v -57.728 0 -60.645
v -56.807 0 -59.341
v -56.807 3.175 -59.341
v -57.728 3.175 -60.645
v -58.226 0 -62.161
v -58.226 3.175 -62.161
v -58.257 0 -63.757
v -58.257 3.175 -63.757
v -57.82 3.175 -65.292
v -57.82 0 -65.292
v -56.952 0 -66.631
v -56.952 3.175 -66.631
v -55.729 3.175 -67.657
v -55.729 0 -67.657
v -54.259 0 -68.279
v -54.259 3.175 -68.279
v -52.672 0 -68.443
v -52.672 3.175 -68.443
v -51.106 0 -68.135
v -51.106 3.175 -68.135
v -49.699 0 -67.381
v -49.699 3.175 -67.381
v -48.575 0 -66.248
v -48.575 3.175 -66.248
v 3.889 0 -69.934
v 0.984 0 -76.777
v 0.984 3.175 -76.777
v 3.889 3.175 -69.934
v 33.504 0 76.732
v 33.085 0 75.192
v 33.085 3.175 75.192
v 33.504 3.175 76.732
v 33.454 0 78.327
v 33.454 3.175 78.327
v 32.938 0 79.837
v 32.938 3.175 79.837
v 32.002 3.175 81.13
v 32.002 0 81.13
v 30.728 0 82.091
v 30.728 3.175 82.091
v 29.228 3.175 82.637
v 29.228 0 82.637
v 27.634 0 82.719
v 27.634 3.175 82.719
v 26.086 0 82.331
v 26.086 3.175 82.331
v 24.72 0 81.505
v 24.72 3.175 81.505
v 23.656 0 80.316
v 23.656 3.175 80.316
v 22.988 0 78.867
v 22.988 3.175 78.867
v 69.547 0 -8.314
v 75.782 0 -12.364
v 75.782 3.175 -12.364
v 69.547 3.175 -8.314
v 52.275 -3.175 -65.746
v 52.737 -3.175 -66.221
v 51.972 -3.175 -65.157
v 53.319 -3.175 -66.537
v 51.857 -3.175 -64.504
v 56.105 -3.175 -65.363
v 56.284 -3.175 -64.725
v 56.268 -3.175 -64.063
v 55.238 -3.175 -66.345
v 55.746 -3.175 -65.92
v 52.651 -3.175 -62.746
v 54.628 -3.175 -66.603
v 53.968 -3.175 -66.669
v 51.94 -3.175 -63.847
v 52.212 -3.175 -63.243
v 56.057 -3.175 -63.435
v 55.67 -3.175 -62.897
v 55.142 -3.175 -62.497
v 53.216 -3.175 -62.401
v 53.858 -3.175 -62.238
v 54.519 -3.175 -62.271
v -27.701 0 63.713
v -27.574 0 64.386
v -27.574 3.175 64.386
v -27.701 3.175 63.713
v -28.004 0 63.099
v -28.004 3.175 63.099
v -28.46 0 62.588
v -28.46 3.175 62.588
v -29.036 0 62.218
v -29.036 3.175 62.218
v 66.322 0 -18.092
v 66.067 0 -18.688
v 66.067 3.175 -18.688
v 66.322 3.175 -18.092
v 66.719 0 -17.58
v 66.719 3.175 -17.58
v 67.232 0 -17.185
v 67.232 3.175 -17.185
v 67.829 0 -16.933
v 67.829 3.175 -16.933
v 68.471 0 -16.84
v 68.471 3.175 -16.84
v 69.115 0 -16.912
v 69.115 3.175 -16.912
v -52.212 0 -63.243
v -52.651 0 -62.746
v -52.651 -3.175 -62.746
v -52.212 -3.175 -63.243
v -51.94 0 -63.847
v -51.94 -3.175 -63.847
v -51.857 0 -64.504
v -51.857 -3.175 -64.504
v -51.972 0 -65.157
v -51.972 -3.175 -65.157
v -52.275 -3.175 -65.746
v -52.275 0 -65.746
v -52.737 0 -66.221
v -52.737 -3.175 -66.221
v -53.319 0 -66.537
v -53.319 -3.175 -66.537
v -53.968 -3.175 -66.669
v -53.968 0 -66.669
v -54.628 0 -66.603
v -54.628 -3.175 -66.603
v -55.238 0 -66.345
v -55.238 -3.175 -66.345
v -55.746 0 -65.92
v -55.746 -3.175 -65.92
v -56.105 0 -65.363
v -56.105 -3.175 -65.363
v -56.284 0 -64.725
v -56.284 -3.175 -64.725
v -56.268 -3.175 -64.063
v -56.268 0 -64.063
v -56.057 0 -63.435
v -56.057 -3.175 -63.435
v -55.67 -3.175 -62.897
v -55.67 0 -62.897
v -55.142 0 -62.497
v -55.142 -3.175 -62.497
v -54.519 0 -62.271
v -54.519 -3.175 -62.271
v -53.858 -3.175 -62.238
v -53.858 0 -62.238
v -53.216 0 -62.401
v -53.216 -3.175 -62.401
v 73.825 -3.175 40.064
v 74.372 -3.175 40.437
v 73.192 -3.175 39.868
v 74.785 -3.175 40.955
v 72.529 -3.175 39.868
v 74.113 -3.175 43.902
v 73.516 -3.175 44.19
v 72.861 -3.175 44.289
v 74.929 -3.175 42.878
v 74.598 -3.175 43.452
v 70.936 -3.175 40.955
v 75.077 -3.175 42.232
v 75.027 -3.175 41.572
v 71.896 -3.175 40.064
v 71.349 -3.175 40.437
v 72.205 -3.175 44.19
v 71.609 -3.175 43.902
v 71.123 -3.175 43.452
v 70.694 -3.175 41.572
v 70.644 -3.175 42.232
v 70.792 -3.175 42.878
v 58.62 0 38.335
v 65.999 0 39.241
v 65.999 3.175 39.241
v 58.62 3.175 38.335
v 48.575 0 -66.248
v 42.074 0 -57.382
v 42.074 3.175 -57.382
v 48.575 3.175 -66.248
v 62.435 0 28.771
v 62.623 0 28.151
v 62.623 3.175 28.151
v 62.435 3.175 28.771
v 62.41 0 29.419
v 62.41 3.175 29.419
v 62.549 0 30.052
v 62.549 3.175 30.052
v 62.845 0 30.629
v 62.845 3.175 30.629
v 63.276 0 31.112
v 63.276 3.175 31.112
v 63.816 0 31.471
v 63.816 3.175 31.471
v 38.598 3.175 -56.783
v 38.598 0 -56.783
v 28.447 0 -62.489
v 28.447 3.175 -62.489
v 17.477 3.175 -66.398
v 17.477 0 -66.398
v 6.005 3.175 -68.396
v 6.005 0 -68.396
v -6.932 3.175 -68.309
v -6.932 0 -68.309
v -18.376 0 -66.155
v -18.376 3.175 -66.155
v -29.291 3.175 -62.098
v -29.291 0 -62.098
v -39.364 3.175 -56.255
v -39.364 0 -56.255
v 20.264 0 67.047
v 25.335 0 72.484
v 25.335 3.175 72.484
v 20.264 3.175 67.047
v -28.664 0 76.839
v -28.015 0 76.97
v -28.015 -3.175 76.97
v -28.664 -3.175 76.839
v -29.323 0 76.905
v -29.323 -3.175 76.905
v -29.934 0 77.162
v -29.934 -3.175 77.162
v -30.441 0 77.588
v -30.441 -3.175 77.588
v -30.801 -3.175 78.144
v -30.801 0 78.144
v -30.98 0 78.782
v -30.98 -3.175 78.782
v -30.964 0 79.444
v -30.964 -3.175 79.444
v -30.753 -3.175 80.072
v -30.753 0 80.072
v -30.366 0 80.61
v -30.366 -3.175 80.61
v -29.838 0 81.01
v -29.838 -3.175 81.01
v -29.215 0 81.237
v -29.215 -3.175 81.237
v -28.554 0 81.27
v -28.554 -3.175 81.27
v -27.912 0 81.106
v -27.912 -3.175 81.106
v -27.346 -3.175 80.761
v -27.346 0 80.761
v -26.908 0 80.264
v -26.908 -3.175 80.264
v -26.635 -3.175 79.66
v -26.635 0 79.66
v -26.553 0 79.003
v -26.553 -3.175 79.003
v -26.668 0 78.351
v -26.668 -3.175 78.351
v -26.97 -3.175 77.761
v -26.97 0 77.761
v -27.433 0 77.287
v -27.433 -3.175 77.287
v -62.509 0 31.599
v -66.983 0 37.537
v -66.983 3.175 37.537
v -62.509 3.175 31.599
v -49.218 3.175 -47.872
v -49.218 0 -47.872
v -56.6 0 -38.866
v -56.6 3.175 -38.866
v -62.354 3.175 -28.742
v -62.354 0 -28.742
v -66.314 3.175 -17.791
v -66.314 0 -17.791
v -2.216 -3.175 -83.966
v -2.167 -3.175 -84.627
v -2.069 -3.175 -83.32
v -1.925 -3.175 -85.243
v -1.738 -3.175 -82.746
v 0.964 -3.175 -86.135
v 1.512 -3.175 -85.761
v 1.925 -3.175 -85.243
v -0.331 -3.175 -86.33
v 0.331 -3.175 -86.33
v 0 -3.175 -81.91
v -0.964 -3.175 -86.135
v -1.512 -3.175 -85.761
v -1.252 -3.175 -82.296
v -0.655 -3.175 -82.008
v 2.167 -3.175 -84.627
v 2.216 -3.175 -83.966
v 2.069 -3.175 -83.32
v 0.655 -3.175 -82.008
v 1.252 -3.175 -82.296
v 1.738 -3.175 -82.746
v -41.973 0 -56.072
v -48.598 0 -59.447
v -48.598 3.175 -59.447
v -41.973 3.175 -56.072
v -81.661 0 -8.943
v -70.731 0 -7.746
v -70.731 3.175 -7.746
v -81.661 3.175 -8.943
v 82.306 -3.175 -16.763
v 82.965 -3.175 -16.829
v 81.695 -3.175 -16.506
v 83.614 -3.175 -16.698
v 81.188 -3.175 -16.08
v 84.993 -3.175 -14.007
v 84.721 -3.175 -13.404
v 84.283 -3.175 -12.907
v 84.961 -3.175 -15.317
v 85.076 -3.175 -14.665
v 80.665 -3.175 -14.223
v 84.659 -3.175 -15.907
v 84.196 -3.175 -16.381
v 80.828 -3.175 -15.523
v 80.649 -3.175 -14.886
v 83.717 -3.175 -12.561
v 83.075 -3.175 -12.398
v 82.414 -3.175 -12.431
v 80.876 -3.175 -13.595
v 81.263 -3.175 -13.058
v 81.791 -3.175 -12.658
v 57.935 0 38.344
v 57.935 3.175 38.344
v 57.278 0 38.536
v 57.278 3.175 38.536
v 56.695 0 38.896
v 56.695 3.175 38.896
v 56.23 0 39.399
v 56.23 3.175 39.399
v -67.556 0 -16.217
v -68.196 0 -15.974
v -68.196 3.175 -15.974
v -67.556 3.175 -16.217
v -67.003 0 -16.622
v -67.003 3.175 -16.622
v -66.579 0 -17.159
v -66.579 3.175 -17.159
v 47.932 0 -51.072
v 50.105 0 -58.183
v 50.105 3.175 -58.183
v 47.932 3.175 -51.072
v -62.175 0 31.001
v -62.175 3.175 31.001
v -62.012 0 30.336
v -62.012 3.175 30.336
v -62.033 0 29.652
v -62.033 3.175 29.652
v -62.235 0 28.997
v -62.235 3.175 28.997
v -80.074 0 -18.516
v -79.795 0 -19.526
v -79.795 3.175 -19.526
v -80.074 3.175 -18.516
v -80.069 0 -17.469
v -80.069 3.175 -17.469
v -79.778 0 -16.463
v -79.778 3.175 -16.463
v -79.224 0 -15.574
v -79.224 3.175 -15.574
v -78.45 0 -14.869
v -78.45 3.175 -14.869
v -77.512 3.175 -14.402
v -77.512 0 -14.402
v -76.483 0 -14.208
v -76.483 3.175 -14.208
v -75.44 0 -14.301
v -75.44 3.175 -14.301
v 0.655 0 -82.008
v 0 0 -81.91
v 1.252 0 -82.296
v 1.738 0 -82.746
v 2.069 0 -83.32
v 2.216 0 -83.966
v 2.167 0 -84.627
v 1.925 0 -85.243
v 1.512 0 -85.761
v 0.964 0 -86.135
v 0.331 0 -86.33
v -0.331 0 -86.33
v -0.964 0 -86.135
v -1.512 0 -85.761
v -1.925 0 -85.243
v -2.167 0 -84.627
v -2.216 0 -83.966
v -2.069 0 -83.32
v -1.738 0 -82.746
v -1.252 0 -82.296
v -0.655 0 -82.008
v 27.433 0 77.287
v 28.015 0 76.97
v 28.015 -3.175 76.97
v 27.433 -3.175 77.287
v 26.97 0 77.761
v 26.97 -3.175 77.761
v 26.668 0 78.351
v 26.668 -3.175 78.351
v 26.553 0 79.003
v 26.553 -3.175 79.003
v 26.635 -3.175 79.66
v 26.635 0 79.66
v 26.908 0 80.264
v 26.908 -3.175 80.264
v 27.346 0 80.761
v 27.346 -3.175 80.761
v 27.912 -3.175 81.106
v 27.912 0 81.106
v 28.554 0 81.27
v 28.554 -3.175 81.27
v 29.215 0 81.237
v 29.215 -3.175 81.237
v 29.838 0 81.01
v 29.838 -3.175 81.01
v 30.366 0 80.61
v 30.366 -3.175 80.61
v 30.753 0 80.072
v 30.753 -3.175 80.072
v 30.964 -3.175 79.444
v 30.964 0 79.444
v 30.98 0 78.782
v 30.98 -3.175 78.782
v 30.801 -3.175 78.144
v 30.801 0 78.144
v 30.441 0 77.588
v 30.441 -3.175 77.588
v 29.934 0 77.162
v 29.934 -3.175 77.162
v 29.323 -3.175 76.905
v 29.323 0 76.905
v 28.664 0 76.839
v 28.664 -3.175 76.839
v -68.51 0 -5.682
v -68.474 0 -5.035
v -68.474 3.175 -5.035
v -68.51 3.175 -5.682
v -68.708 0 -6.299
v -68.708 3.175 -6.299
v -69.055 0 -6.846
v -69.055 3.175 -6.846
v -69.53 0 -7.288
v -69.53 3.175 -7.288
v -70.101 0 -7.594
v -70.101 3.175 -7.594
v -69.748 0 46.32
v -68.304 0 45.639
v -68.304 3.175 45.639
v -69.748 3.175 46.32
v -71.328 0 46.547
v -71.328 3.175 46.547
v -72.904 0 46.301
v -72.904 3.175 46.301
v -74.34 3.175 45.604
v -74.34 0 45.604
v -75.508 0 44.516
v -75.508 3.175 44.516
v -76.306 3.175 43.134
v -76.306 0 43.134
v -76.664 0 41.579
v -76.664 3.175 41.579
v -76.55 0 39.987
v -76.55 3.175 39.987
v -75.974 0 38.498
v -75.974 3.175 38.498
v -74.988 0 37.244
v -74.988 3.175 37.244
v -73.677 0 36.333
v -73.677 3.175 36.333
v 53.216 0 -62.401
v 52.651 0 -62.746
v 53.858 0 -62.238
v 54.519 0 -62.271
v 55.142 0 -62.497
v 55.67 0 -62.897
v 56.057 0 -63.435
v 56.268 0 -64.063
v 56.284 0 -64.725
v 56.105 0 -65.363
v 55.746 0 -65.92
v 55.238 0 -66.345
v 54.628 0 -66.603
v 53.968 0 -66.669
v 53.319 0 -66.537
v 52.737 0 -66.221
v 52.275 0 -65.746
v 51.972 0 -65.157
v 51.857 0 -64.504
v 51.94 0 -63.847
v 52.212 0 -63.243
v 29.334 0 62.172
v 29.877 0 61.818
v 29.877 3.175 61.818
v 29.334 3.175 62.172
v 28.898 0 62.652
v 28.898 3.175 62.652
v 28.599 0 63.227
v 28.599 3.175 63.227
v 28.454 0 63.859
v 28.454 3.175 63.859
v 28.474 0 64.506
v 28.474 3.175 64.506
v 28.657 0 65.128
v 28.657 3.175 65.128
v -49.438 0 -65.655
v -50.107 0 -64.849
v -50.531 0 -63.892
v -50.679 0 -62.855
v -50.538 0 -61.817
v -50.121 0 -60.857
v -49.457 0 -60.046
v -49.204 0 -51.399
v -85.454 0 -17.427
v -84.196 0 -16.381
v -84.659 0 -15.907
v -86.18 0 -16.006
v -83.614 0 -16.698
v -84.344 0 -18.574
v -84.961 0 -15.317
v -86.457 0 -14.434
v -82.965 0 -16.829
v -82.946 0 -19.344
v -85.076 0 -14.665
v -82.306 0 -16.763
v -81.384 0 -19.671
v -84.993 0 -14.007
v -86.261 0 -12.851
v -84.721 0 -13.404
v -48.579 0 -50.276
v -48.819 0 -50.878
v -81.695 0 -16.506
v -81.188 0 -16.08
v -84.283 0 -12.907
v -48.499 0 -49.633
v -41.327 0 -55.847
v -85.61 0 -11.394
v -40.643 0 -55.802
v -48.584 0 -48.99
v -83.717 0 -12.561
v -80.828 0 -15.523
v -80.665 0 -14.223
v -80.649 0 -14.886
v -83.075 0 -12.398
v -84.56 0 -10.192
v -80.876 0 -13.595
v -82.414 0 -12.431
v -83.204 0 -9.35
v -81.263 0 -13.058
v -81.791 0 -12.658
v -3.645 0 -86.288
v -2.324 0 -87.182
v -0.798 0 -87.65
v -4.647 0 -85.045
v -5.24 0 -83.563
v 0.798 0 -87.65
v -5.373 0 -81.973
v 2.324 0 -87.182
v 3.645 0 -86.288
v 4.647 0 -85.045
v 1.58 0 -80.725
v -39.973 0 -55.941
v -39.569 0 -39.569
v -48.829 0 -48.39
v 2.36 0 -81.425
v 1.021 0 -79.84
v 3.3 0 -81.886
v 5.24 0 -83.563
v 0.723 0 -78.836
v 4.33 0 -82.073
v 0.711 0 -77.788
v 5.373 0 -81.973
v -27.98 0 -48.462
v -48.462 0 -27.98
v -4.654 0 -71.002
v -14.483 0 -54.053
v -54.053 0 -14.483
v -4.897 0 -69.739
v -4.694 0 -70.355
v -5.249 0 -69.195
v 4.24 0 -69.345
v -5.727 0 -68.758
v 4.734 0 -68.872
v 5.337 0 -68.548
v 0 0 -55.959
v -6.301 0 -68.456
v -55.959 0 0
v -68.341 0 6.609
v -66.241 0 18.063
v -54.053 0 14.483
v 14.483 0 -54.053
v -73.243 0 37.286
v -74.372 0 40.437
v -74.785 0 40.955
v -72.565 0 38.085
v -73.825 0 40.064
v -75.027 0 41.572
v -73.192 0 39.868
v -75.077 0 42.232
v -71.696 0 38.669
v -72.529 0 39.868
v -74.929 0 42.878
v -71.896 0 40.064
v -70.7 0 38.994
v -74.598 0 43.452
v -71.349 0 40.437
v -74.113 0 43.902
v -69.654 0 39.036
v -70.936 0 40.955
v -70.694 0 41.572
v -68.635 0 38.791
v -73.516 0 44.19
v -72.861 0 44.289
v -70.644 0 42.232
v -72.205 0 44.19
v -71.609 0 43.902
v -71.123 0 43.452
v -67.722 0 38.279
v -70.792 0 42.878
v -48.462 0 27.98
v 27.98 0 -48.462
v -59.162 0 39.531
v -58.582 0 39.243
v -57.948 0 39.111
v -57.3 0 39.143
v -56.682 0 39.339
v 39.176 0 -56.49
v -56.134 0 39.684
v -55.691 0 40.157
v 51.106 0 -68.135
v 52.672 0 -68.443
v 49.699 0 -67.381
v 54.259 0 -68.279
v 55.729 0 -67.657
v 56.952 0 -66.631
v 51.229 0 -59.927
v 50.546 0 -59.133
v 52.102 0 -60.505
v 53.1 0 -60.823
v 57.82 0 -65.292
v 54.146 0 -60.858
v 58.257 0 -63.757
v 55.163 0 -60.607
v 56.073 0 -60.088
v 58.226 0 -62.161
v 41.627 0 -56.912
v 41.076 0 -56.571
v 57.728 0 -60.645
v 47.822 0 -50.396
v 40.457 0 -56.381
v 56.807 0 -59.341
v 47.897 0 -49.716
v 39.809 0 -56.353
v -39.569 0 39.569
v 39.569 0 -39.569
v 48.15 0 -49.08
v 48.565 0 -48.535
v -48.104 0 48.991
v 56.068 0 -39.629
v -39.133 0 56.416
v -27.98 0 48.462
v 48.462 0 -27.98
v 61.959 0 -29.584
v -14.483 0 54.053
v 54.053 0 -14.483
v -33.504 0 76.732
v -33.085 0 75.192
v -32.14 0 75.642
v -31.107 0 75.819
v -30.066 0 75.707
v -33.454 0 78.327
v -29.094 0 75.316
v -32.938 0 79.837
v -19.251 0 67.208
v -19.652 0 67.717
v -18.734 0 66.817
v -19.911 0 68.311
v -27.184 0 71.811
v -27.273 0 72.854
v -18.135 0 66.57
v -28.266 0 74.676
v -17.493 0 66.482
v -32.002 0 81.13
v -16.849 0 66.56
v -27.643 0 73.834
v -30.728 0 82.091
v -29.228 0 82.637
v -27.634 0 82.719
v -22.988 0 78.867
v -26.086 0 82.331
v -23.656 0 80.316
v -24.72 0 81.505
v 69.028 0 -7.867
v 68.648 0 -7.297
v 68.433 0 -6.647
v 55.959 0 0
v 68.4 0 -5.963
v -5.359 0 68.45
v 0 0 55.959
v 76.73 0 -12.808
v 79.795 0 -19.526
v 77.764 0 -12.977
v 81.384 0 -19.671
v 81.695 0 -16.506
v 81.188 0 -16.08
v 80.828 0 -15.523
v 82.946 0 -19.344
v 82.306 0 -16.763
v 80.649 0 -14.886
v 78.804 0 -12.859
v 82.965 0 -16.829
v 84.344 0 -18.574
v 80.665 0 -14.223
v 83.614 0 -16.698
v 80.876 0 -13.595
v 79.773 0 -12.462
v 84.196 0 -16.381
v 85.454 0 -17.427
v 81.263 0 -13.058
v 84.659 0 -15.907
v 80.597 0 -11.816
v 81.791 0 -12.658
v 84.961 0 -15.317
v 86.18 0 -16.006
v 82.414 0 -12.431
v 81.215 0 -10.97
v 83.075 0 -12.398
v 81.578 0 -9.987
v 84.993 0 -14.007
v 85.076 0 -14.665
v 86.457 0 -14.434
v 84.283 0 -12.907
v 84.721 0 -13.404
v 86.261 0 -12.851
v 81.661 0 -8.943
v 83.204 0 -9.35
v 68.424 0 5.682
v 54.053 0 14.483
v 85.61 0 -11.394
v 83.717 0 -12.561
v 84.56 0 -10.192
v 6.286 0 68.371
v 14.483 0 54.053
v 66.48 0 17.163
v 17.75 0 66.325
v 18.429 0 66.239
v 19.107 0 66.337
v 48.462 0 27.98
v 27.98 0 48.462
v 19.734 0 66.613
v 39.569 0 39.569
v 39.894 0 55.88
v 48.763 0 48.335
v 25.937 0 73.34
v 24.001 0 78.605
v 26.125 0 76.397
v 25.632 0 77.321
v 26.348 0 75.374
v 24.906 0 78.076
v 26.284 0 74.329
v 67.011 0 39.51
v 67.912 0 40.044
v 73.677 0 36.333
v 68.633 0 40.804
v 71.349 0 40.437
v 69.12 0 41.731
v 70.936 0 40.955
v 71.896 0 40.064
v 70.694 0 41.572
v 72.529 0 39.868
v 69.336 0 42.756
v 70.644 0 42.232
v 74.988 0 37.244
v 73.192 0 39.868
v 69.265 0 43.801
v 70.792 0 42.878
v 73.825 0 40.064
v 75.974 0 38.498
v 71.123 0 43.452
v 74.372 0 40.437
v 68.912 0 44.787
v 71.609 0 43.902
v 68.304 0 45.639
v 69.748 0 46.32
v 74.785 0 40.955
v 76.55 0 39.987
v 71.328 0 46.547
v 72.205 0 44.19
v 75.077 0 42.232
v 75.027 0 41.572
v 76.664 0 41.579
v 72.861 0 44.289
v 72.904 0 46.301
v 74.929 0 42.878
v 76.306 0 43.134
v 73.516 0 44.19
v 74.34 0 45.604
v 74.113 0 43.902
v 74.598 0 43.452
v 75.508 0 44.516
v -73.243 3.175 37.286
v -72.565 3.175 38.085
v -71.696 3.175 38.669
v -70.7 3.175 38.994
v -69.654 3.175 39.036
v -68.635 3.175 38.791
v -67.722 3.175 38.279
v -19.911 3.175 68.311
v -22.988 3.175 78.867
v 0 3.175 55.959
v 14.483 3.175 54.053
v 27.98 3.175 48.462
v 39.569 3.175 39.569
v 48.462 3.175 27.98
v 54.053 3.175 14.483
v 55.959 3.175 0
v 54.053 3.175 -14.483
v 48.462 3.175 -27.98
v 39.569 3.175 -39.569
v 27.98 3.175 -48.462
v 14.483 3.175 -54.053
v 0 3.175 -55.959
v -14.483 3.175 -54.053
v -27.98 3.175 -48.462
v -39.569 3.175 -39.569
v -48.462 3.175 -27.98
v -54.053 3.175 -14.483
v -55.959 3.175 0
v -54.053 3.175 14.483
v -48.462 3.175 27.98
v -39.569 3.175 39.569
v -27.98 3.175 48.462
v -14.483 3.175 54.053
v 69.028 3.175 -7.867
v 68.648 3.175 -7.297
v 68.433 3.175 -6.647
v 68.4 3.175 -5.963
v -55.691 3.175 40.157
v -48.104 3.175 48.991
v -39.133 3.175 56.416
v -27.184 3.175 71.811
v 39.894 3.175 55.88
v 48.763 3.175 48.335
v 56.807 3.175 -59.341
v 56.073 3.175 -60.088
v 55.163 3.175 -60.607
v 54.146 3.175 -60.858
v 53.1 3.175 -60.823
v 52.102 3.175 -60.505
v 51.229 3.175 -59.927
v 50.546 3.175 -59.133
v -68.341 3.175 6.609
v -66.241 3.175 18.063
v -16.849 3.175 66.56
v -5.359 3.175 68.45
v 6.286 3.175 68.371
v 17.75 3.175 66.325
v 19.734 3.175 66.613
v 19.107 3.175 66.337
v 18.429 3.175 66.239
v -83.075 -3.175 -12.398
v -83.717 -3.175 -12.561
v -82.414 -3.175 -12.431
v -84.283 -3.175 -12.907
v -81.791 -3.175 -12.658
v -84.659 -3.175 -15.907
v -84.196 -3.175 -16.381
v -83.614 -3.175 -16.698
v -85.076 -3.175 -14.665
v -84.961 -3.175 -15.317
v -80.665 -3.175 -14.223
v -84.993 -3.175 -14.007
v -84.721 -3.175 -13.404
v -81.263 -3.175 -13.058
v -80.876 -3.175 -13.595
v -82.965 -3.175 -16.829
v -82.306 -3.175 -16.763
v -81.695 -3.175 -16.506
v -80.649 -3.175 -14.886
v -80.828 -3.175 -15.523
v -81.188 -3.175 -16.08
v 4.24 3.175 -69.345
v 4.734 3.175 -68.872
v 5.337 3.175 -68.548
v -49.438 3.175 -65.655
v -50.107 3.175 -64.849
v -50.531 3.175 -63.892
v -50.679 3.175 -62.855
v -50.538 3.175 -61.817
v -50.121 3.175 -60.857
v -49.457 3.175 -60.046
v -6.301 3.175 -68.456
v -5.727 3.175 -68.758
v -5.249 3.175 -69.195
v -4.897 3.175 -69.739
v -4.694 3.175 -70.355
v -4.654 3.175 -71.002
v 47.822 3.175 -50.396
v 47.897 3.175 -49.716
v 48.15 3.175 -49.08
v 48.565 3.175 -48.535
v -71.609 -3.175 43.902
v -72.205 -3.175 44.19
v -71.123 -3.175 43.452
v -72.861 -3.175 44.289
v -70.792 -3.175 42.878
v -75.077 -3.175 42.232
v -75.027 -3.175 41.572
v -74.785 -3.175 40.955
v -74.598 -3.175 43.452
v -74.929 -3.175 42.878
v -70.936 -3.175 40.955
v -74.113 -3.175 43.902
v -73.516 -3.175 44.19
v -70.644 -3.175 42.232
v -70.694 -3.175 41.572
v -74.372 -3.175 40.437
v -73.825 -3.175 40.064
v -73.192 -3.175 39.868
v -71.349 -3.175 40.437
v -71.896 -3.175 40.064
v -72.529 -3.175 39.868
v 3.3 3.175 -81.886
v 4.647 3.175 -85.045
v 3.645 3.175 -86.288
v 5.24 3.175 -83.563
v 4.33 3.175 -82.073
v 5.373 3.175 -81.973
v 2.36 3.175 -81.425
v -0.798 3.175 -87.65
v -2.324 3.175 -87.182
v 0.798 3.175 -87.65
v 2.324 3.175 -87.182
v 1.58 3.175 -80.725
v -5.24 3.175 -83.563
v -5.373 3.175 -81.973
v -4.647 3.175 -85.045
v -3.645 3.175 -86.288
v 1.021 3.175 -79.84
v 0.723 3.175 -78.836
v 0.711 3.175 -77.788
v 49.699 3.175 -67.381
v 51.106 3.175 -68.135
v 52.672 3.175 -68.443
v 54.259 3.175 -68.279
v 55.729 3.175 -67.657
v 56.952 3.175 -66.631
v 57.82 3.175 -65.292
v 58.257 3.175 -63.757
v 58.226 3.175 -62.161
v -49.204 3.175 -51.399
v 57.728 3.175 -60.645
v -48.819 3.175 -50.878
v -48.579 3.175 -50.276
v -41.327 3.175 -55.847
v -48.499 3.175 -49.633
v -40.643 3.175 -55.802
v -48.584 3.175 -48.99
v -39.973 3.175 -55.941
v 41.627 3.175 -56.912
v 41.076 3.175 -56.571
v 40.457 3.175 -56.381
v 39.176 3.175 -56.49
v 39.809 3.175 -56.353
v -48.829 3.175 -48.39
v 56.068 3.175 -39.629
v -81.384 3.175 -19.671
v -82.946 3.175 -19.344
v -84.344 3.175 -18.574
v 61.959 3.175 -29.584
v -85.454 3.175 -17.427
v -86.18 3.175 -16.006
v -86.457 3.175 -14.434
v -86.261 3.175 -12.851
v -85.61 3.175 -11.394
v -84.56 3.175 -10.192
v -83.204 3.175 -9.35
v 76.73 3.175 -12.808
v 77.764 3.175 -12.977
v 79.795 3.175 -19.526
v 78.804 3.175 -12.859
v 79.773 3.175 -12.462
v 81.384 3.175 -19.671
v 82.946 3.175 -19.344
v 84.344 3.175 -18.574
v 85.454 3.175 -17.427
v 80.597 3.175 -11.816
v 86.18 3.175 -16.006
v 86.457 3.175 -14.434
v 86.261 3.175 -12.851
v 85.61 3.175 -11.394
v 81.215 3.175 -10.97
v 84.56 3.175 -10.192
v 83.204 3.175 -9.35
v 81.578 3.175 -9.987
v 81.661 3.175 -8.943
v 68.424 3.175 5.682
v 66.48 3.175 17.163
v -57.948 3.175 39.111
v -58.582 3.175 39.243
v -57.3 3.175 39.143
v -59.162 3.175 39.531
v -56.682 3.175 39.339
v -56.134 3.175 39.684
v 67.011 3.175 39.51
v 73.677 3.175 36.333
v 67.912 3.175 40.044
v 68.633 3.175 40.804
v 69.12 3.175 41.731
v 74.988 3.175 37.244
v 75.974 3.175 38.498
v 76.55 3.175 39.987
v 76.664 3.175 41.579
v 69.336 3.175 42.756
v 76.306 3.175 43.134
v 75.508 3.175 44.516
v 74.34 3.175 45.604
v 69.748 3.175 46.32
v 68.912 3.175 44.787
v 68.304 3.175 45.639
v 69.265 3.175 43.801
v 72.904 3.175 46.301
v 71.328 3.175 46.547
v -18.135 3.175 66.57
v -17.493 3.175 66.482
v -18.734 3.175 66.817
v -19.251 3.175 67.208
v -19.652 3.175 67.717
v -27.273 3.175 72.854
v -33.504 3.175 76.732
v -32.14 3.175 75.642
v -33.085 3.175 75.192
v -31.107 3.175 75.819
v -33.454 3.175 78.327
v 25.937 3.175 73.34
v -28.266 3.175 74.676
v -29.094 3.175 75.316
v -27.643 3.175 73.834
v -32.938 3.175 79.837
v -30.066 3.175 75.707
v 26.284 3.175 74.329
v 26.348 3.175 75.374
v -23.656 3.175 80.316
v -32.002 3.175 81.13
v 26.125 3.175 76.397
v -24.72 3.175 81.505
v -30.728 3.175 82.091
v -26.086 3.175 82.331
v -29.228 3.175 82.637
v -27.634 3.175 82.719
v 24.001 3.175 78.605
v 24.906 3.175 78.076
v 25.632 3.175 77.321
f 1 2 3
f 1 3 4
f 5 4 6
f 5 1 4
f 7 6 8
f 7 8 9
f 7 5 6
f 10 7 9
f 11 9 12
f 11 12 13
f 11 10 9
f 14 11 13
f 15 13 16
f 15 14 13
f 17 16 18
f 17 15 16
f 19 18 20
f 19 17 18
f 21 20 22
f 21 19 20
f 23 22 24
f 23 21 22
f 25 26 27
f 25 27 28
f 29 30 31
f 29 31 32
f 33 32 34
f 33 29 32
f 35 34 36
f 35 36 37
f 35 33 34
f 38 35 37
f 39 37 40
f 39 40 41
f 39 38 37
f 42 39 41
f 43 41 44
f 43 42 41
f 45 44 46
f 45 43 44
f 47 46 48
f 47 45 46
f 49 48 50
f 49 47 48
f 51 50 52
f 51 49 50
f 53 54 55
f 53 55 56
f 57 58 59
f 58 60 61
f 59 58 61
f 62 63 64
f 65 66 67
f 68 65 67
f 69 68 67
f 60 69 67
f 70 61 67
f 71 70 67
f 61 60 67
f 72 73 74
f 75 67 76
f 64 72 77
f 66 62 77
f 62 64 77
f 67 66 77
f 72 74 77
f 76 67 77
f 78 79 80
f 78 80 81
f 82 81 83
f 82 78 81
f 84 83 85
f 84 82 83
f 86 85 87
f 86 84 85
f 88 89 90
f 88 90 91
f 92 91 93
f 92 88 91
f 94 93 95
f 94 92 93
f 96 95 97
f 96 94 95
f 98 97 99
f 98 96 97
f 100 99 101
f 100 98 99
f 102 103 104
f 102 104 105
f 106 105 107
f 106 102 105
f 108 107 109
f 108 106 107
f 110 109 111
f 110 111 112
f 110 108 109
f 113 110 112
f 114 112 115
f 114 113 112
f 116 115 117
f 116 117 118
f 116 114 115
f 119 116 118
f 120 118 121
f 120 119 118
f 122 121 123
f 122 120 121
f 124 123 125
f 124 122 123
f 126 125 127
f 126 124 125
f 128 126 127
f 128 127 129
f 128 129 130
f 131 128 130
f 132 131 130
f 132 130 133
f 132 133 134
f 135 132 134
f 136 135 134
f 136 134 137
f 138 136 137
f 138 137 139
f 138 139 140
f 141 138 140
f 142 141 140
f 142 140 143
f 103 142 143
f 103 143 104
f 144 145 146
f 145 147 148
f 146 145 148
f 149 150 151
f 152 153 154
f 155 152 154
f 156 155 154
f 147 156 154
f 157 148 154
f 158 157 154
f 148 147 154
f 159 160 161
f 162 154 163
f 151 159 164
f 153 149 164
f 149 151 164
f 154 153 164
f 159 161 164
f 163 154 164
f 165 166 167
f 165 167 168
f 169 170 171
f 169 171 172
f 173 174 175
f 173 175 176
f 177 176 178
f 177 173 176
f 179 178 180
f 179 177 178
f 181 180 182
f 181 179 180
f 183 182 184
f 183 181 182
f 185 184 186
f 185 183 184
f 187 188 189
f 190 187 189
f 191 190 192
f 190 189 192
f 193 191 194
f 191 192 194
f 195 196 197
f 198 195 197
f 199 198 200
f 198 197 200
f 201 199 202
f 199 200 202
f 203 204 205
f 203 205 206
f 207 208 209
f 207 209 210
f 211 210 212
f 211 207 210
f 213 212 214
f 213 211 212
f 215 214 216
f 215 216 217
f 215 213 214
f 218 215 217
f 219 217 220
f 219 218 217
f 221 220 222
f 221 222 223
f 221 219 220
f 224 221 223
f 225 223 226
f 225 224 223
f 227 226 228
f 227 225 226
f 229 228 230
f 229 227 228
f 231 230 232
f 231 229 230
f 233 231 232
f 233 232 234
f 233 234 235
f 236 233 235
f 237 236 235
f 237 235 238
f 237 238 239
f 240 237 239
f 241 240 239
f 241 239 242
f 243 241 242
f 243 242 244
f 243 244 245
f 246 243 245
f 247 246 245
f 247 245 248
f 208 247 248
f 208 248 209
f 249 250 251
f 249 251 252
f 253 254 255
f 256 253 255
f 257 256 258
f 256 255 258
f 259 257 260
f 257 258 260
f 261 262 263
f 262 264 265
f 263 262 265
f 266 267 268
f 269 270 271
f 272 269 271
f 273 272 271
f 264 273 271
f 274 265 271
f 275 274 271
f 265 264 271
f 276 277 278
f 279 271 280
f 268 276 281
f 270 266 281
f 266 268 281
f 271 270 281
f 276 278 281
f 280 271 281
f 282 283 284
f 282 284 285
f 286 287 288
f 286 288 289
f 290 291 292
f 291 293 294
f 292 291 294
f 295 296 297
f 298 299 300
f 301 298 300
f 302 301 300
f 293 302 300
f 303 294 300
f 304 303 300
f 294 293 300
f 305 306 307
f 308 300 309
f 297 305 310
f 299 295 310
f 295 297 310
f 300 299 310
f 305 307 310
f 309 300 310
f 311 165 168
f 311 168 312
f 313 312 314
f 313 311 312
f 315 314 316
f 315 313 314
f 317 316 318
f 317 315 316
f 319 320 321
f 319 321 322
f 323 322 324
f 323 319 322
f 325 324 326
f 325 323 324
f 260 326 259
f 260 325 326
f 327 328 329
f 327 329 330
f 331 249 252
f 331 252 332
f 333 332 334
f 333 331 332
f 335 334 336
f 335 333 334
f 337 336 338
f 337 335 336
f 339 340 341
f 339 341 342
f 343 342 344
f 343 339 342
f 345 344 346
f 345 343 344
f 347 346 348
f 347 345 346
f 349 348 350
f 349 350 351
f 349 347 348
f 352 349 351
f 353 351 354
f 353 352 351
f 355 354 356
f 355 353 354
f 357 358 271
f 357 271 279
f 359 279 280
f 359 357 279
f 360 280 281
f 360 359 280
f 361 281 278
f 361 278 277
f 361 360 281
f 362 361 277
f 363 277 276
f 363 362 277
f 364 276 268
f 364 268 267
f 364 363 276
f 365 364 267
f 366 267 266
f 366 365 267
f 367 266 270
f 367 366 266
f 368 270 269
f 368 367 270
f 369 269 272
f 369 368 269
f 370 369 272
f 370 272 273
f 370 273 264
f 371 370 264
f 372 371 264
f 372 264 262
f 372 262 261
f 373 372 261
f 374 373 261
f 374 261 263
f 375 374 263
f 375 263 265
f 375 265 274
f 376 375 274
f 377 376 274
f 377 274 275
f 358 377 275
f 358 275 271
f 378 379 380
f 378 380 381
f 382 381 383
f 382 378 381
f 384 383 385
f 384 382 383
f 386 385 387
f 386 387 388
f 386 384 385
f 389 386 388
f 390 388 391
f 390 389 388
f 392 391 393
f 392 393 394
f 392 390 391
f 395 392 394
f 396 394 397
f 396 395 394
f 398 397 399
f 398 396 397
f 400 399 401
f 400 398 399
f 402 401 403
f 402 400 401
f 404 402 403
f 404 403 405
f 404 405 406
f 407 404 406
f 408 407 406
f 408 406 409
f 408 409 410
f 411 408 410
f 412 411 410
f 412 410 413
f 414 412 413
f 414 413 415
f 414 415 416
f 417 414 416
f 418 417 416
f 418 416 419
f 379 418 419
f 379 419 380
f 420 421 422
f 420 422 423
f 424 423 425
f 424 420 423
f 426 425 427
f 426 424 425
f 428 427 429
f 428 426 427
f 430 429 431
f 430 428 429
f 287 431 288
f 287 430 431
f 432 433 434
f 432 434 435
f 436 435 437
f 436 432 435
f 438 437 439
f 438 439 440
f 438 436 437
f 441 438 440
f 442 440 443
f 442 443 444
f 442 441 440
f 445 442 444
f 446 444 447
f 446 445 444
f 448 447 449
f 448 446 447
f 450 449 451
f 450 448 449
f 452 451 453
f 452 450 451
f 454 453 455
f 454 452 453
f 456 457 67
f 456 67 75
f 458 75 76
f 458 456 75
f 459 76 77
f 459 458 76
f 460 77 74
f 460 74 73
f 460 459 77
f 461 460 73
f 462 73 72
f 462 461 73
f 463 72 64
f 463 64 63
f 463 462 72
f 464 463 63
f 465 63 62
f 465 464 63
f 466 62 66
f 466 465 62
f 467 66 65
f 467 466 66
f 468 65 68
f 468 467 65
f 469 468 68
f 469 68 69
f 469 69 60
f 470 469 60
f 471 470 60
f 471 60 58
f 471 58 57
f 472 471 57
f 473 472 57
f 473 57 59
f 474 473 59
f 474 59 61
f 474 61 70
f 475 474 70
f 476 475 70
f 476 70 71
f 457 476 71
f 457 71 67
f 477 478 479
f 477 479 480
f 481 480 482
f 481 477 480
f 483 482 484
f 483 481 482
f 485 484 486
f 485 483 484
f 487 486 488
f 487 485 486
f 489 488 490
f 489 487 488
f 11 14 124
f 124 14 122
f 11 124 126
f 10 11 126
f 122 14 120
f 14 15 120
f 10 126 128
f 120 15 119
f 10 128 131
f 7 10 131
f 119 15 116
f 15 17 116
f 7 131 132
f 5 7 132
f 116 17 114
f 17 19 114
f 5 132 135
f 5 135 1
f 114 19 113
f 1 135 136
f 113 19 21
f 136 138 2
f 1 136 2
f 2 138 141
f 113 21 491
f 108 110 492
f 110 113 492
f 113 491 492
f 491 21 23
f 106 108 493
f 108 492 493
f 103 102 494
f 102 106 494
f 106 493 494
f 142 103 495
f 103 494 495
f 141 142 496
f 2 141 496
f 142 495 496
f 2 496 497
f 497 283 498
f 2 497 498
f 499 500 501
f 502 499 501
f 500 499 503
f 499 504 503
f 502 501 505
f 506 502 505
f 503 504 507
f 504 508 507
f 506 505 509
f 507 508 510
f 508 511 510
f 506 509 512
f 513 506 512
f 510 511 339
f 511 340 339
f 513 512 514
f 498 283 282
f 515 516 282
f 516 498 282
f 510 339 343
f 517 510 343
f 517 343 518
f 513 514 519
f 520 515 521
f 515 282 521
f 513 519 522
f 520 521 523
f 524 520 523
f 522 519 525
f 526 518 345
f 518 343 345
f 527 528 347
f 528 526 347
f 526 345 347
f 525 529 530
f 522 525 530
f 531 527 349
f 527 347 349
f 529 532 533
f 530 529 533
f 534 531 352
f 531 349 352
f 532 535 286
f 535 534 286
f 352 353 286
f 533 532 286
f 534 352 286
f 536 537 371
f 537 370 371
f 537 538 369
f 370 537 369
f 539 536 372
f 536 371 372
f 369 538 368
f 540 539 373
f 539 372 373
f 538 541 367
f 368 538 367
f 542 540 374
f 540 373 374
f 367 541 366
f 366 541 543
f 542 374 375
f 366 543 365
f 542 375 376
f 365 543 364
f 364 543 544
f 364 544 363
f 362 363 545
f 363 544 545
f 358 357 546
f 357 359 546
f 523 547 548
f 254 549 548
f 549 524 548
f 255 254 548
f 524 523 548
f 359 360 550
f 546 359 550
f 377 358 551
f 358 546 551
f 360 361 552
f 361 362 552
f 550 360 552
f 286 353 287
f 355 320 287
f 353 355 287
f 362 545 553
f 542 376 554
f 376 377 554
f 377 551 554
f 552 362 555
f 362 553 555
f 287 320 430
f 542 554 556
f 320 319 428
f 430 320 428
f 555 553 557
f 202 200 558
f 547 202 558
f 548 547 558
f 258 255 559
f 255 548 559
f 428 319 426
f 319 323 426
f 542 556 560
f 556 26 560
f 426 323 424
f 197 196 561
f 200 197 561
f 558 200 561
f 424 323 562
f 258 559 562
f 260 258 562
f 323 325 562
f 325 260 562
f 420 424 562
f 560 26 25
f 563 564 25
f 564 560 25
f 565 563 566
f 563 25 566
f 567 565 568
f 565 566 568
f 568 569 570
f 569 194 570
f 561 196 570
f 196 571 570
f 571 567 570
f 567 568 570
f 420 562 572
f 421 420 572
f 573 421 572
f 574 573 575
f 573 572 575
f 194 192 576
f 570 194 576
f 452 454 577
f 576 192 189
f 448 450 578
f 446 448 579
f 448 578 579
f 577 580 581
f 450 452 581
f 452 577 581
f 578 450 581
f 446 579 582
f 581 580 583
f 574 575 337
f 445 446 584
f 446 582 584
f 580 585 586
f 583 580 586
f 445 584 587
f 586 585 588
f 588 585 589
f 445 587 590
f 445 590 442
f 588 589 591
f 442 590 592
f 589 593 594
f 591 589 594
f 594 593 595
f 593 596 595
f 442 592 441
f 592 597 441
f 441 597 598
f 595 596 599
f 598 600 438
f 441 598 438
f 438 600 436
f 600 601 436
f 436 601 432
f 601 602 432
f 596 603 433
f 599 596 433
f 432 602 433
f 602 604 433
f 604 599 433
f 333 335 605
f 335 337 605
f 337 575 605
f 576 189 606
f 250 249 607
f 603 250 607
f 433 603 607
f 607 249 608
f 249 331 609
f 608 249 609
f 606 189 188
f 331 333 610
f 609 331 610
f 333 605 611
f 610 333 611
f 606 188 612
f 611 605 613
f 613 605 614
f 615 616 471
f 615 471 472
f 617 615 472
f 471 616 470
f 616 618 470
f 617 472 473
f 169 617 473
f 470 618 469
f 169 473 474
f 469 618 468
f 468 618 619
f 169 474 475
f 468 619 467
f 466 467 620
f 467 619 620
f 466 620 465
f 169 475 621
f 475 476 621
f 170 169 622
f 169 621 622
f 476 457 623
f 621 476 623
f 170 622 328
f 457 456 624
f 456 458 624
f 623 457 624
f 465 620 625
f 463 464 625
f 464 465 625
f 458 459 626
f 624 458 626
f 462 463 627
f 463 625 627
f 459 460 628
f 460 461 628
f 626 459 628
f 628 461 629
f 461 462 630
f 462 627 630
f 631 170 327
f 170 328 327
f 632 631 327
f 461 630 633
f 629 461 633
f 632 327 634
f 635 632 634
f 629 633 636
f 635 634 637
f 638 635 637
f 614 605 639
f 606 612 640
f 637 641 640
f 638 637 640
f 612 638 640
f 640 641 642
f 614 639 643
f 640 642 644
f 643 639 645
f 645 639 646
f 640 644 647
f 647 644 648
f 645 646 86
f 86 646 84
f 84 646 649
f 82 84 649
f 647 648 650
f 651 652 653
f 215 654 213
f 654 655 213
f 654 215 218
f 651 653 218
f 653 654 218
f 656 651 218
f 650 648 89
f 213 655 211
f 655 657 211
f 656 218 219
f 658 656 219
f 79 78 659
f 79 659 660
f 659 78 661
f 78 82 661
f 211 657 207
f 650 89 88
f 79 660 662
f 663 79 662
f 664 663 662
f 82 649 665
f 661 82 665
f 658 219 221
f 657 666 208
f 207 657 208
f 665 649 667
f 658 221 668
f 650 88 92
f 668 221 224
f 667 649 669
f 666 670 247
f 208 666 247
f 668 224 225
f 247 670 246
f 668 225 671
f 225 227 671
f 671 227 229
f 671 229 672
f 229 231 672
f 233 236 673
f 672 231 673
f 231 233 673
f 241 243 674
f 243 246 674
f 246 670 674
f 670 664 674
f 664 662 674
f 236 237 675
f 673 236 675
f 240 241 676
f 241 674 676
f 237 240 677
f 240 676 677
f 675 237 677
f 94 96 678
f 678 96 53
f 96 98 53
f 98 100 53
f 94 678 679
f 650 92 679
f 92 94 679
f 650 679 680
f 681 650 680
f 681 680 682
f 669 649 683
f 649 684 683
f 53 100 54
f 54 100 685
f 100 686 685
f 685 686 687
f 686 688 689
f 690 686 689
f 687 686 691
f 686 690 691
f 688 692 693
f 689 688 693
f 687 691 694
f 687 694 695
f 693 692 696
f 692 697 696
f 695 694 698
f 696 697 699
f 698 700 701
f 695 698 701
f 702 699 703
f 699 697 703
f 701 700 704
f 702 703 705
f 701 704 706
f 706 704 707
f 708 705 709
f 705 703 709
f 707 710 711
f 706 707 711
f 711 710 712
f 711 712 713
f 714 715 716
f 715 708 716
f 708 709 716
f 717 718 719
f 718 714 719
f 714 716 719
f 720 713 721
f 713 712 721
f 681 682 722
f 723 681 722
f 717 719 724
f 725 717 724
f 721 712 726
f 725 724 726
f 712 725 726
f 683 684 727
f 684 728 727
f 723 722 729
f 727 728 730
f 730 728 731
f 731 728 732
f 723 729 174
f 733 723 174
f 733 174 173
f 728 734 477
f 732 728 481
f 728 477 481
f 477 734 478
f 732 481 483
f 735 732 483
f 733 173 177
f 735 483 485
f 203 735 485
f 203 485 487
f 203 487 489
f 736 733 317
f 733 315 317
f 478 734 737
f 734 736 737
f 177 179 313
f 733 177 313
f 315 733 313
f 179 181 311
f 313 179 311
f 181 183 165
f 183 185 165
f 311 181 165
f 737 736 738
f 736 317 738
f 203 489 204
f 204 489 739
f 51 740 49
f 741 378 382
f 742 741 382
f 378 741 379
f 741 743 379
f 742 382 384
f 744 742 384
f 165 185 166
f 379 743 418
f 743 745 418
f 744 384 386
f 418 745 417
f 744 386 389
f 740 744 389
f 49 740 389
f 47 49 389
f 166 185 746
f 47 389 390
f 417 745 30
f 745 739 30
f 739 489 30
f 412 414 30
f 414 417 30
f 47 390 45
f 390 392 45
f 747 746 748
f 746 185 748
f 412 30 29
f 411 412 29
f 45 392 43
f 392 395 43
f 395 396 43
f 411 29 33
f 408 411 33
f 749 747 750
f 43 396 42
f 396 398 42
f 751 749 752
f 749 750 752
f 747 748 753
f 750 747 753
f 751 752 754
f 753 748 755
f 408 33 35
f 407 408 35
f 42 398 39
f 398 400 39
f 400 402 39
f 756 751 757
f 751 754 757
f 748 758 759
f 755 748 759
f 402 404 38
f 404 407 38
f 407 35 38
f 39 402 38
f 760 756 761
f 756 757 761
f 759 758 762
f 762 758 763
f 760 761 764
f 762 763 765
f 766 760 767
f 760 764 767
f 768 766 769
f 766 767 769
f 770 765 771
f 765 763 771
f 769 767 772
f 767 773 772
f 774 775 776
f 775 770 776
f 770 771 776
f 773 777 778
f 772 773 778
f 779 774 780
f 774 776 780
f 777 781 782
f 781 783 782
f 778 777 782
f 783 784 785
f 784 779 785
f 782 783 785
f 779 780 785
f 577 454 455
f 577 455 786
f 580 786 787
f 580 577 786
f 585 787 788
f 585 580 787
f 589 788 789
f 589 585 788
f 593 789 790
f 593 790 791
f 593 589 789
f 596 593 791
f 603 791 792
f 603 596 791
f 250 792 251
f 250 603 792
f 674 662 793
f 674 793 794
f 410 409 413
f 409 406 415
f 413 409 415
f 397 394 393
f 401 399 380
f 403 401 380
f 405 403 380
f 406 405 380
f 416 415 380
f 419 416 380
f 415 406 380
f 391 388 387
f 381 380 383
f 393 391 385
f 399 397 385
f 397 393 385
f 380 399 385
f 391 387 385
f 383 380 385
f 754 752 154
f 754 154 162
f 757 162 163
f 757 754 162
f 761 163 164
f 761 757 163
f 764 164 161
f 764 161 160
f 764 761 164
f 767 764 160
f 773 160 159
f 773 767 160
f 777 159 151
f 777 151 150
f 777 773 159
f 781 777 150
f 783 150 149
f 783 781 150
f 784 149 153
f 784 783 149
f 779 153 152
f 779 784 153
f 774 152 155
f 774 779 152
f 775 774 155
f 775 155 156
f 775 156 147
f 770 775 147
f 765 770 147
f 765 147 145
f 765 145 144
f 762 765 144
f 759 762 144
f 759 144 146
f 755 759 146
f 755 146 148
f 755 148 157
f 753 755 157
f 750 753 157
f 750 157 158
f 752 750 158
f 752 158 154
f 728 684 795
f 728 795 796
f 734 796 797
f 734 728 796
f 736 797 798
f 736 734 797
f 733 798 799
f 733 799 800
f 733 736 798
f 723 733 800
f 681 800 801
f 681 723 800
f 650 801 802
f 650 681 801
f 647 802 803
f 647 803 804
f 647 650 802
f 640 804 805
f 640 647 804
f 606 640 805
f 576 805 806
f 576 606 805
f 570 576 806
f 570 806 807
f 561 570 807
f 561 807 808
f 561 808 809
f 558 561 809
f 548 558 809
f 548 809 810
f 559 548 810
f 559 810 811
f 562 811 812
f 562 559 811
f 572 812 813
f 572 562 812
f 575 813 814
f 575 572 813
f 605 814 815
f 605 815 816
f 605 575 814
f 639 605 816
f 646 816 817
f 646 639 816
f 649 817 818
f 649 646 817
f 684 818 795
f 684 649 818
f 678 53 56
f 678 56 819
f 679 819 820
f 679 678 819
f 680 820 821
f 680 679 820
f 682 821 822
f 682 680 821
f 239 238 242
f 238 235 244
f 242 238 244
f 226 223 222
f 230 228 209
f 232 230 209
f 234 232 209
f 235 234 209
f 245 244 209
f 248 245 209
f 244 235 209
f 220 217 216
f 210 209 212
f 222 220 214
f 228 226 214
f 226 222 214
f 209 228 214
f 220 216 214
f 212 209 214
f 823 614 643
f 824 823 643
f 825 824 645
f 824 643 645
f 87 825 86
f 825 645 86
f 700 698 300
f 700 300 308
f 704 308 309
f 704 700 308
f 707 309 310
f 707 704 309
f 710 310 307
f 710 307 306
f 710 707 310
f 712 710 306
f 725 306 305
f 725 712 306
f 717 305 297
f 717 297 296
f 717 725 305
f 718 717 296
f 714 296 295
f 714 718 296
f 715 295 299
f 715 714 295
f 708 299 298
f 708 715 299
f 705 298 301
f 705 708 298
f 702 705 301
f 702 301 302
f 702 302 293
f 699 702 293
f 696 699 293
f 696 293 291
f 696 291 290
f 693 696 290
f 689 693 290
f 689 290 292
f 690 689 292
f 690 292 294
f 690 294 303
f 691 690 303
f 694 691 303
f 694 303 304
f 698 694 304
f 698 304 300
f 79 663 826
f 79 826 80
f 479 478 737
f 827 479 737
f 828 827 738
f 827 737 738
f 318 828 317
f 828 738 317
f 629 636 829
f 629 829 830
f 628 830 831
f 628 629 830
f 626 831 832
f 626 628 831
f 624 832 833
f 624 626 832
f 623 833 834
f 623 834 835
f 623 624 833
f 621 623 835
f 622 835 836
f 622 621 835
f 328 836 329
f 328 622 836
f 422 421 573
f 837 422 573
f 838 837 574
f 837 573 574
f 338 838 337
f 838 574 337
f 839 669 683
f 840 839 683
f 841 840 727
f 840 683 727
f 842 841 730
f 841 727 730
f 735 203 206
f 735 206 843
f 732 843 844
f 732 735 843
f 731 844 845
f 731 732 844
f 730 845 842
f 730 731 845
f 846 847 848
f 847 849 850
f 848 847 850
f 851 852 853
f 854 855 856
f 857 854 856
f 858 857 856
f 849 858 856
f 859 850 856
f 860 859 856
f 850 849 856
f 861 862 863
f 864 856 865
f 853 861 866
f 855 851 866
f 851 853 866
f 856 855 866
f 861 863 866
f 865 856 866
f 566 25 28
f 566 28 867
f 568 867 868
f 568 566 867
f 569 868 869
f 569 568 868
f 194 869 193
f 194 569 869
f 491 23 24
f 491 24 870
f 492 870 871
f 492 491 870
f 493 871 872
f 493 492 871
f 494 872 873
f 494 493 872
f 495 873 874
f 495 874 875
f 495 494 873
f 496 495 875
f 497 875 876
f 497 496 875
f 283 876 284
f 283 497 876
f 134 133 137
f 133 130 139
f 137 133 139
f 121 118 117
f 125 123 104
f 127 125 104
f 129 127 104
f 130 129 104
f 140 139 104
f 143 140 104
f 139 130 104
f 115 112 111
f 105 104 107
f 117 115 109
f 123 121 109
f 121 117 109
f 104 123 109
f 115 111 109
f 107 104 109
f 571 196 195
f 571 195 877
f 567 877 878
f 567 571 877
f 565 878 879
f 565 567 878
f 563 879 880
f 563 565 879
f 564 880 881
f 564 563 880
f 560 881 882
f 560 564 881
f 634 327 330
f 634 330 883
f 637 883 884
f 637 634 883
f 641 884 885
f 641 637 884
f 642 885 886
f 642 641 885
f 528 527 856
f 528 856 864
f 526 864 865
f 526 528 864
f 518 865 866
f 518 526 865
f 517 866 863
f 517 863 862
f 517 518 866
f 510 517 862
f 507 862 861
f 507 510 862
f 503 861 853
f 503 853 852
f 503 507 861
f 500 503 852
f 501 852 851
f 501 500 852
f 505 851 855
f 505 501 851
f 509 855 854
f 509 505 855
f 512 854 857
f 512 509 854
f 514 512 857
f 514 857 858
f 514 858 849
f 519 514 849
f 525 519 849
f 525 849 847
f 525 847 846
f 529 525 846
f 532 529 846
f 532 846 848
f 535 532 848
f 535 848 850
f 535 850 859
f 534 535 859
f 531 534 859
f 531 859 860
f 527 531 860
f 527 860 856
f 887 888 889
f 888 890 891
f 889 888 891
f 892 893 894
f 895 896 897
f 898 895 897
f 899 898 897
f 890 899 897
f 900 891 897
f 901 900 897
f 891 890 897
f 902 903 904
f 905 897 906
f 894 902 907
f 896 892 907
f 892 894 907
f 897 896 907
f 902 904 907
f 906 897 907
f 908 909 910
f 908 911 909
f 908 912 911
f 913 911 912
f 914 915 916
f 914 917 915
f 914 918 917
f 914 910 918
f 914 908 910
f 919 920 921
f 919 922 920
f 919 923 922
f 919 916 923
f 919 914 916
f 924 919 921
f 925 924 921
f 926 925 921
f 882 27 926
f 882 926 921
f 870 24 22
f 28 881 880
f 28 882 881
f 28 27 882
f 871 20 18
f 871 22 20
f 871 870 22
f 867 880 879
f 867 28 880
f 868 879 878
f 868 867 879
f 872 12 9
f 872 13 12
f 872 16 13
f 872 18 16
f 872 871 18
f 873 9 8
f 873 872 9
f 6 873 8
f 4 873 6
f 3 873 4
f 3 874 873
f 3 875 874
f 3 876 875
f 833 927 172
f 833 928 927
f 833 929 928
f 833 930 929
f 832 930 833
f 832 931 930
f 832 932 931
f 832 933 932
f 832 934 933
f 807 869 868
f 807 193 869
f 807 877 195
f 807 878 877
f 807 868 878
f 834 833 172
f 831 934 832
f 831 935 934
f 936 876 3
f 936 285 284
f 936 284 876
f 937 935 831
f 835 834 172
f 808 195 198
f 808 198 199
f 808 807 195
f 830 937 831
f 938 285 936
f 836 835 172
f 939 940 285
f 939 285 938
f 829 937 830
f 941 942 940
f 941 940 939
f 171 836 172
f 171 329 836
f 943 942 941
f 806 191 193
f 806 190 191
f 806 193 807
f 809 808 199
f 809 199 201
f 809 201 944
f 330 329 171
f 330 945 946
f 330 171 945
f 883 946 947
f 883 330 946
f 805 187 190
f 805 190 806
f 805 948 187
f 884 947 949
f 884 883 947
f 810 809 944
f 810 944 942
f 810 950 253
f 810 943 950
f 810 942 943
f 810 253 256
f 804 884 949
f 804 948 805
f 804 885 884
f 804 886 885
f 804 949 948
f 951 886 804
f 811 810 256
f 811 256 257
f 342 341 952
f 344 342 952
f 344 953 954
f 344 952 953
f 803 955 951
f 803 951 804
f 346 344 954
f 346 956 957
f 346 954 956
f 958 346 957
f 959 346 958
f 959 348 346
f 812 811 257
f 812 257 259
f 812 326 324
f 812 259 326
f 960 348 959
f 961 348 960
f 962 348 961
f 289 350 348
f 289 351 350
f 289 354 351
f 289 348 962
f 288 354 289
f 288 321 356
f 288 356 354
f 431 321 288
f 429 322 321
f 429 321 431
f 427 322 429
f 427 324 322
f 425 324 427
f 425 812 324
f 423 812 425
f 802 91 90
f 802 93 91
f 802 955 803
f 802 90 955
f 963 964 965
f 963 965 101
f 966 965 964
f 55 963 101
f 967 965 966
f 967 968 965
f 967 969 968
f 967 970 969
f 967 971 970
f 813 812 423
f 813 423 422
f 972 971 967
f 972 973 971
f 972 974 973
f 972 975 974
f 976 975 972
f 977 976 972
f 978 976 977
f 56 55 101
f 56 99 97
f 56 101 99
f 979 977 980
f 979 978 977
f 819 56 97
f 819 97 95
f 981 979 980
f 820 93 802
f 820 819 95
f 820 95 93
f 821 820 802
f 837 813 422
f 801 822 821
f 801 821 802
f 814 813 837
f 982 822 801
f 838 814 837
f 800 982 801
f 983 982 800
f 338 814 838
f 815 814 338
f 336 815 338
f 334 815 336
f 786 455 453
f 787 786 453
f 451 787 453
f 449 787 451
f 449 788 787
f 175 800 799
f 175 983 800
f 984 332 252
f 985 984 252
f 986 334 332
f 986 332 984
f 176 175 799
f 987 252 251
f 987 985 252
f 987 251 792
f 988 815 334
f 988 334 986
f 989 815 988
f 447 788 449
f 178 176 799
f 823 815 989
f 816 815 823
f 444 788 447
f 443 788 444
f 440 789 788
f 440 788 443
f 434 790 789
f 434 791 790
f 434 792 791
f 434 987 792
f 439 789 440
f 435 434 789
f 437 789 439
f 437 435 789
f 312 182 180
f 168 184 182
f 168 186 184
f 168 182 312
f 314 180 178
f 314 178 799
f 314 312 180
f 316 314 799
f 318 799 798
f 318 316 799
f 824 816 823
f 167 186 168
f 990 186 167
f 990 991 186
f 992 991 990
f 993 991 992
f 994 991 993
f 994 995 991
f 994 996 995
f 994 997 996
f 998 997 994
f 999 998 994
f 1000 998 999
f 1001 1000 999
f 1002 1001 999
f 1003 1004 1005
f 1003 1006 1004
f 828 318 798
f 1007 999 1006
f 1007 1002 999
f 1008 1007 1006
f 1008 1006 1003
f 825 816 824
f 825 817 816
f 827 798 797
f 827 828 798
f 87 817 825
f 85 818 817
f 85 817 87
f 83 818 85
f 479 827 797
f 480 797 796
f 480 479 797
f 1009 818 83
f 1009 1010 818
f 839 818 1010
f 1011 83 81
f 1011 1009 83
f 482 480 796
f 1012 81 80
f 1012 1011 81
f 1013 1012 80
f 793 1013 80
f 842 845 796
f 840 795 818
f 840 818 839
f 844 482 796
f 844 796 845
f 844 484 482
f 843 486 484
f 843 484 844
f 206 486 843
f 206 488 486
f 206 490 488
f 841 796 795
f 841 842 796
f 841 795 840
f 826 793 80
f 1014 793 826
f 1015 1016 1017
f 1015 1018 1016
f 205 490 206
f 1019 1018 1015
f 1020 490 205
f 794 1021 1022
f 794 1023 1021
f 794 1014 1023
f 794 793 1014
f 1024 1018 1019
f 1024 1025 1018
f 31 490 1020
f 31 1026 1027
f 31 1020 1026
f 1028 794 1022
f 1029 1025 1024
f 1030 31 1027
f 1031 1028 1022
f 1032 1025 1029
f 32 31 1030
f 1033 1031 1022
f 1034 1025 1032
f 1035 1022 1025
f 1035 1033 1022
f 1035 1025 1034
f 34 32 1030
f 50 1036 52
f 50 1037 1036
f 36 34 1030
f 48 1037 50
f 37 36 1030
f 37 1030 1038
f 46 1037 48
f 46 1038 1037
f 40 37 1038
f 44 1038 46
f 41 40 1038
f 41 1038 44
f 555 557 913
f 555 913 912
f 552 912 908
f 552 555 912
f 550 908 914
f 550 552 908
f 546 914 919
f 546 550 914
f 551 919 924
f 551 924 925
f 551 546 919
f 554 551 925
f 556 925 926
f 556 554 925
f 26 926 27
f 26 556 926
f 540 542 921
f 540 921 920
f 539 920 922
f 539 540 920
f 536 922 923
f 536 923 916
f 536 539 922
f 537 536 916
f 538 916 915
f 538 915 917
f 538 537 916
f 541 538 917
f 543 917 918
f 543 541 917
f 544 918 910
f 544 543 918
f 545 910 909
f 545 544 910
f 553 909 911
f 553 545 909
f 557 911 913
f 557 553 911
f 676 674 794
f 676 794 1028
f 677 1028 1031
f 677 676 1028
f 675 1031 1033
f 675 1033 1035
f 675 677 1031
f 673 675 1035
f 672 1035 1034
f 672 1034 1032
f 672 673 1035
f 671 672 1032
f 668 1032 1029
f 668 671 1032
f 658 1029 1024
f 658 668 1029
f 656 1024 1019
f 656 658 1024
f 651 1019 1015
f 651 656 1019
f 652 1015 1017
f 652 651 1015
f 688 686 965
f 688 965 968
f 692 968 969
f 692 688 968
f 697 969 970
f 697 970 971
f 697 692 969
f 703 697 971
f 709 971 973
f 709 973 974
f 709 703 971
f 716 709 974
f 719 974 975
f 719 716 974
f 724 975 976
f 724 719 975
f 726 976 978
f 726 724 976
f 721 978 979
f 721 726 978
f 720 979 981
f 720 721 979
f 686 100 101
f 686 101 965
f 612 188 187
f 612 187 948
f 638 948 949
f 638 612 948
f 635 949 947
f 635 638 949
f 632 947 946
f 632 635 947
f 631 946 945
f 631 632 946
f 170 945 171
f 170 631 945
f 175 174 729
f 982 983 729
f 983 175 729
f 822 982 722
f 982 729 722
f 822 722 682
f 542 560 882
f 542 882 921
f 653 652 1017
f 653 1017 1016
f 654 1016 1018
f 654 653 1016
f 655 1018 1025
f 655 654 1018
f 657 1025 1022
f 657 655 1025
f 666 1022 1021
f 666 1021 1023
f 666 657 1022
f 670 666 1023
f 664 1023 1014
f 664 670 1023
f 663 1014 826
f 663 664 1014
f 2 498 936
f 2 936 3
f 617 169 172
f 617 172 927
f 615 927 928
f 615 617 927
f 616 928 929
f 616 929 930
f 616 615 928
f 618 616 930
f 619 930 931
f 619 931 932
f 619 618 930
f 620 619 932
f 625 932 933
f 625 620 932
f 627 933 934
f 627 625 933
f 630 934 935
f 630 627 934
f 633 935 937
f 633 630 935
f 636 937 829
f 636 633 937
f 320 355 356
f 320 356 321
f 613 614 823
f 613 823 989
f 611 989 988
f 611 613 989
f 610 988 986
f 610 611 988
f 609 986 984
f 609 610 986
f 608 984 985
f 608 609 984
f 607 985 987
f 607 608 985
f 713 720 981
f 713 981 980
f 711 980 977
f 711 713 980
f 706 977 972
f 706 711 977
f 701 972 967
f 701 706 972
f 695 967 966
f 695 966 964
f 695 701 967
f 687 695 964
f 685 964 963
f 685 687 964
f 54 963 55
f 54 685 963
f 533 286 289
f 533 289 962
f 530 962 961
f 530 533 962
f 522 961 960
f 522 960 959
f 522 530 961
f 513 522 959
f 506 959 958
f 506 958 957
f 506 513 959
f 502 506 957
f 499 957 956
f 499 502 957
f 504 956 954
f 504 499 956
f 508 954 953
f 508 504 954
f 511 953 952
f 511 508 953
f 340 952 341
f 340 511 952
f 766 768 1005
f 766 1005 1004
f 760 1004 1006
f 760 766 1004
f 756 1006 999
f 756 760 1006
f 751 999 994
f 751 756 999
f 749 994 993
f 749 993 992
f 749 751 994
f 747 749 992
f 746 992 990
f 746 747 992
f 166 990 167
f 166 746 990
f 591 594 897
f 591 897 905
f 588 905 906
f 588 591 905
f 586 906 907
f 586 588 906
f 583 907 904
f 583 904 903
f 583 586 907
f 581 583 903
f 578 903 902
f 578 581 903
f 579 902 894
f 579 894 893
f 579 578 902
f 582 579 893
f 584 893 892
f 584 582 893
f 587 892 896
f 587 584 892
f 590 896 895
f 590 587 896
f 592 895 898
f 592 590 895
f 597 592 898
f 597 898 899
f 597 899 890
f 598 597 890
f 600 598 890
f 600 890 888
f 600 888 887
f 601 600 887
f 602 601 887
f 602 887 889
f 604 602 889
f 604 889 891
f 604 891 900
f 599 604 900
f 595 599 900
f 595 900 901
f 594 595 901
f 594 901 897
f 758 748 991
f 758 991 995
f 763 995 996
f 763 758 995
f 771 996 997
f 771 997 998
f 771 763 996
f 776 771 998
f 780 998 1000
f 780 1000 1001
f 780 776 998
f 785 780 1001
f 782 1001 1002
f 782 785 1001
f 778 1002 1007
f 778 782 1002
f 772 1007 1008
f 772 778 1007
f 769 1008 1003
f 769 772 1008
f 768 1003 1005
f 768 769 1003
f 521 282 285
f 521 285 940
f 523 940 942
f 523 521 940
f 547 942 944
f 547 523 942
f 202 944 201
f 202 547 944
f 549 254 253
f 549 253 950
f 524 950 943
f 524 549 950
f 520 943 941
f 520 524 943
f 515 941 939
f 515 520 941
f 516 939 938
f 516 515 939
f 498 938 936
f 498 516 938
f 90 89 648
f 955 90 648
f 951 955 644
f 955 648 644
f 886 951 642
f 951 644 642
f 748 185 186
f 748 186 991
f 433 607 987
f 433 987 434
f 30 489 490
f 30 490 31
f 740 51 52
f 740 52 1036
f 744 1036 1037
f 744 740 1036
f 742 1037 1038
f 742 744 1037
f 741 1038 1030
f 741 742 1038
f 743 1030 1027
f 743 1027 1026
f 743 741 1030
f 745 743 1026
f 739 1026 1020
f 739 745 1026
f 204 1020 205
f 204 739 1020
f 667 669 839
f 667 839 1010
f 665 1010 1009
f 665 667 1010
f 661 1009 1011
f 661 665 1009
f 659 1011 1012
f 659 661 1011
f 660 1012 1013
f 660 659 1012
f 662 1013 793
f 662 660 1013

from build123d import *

# Parameters (mm, degrees)
SKETCH1_R           = 68.659375
SKETCH1_R_2         = 55.959375
BOSS_EXTRUDE1_DEPTH = 3.175
BOSS_EXTRUDE2_START = -3.175
BOSS_EXTRUDE2_DEPTH = 3.175
CIRPATTERN1_COUNT   = 9
SKETCH3_R           = 2.2225
BOSS_EXTRUDE3_DEPTH = 6.35
CIRPATTERN13_COUNT  = 9


with BuildPart() as part:
    # Sketch1 → Boss-Extrude1 (new body)
    with BuildSketch(Plane(origin=(0, 0, 0), x_dir=(1, 0, 0), z_dir=(0, 1, 0))):
        with Locations(Location((0, 0, 0), (0, 0, 270))):
            Circle(SKETCH1_R)
        with Locations(Location((0, 0, 0), (0, 0, 270))):
            Circle(SKETCH1_R_2, mode=Mode.SUBTRACT)
    extrude(amount=BOSS_EXTRUDE1_DEPTH)

    # Sketch2 → Boss-Extrude2 (add)
    with BuildSketch(Plane(origin=(0, 3.175, 0), x_dir=(1, 0, 0), z_dir=(0, 1, 0)).offset(BOSS_EXTRUDE2_START)):
        with BuildLine():
            Line((-4.653697789, 71.001707707), (-5.372788209, 81.972907412))
            ThreePointArc((-5.372788209, 81.972907412), (0, 87.709375), (5.372788209, 81.972907412))
            ThreePointArc((5.372788209, 81.972907412), (1.580107525, 80.725221164), (0.983574692, 76.777399446))
            Line((0.983574692, 76.777399446), (3.889375, 69.933810414))
            ThreePointArc((3.889375, 69.933810414), (4.734169071, 68.871766239), (6.005193091, 68.39625305))
            ThreePointArc((6.005193091, 68.39625305), (-0.46538454, 68.657797755), (-6.931822104, 68.308561818))
            ThreePointArc((-6.931822104, 68.308561818), (-5.249012804, 69.195180628), (-4.653697789, 71.001707707))
        make_face()
    boss_extrude2 = extrude(amount=BOSS_EXTRUDE2_DEPTH)

    # CirPattern1: Boss-Extrude2 ×9 about axis
    cirpattern1_axis = Axis((0, 0, 0), (0, 1, 0))
    for i in range(1, CIRPATTERN1_COUNT):
        add(boss_extrude2.rotate(cirpattern1_axis, i * 360 / CIRPATTERN1_COUNT))

    # Sketch3 → Boss-Extrude3 (add)
    with BuildSketch(Plane(origin=(0, 3.175, 0), x_dir=(1, 0, 0), z_dir=(0, 1, 0))):
        with Locations(Location((0, 84.132166, 0), (0, 0, 270))):
            Circle(SKETCH3_R)
    boss_extrude3 = extrude(amount=-BOSS_EXTRUDE3_DEPTH)

    # CirPattern13: Boss-Extrude3 ×9 about axis
    cirpattern13_axis = Axis((0, 0, 0), (0, 1, 0))
    for i in range(1, CIRPATTERN13_COUNT):
        add(boss_extrude3.rotate(cirpattern13_axis, i * 360 / CIRPATTERN13_COUNT))


solid = part.part
